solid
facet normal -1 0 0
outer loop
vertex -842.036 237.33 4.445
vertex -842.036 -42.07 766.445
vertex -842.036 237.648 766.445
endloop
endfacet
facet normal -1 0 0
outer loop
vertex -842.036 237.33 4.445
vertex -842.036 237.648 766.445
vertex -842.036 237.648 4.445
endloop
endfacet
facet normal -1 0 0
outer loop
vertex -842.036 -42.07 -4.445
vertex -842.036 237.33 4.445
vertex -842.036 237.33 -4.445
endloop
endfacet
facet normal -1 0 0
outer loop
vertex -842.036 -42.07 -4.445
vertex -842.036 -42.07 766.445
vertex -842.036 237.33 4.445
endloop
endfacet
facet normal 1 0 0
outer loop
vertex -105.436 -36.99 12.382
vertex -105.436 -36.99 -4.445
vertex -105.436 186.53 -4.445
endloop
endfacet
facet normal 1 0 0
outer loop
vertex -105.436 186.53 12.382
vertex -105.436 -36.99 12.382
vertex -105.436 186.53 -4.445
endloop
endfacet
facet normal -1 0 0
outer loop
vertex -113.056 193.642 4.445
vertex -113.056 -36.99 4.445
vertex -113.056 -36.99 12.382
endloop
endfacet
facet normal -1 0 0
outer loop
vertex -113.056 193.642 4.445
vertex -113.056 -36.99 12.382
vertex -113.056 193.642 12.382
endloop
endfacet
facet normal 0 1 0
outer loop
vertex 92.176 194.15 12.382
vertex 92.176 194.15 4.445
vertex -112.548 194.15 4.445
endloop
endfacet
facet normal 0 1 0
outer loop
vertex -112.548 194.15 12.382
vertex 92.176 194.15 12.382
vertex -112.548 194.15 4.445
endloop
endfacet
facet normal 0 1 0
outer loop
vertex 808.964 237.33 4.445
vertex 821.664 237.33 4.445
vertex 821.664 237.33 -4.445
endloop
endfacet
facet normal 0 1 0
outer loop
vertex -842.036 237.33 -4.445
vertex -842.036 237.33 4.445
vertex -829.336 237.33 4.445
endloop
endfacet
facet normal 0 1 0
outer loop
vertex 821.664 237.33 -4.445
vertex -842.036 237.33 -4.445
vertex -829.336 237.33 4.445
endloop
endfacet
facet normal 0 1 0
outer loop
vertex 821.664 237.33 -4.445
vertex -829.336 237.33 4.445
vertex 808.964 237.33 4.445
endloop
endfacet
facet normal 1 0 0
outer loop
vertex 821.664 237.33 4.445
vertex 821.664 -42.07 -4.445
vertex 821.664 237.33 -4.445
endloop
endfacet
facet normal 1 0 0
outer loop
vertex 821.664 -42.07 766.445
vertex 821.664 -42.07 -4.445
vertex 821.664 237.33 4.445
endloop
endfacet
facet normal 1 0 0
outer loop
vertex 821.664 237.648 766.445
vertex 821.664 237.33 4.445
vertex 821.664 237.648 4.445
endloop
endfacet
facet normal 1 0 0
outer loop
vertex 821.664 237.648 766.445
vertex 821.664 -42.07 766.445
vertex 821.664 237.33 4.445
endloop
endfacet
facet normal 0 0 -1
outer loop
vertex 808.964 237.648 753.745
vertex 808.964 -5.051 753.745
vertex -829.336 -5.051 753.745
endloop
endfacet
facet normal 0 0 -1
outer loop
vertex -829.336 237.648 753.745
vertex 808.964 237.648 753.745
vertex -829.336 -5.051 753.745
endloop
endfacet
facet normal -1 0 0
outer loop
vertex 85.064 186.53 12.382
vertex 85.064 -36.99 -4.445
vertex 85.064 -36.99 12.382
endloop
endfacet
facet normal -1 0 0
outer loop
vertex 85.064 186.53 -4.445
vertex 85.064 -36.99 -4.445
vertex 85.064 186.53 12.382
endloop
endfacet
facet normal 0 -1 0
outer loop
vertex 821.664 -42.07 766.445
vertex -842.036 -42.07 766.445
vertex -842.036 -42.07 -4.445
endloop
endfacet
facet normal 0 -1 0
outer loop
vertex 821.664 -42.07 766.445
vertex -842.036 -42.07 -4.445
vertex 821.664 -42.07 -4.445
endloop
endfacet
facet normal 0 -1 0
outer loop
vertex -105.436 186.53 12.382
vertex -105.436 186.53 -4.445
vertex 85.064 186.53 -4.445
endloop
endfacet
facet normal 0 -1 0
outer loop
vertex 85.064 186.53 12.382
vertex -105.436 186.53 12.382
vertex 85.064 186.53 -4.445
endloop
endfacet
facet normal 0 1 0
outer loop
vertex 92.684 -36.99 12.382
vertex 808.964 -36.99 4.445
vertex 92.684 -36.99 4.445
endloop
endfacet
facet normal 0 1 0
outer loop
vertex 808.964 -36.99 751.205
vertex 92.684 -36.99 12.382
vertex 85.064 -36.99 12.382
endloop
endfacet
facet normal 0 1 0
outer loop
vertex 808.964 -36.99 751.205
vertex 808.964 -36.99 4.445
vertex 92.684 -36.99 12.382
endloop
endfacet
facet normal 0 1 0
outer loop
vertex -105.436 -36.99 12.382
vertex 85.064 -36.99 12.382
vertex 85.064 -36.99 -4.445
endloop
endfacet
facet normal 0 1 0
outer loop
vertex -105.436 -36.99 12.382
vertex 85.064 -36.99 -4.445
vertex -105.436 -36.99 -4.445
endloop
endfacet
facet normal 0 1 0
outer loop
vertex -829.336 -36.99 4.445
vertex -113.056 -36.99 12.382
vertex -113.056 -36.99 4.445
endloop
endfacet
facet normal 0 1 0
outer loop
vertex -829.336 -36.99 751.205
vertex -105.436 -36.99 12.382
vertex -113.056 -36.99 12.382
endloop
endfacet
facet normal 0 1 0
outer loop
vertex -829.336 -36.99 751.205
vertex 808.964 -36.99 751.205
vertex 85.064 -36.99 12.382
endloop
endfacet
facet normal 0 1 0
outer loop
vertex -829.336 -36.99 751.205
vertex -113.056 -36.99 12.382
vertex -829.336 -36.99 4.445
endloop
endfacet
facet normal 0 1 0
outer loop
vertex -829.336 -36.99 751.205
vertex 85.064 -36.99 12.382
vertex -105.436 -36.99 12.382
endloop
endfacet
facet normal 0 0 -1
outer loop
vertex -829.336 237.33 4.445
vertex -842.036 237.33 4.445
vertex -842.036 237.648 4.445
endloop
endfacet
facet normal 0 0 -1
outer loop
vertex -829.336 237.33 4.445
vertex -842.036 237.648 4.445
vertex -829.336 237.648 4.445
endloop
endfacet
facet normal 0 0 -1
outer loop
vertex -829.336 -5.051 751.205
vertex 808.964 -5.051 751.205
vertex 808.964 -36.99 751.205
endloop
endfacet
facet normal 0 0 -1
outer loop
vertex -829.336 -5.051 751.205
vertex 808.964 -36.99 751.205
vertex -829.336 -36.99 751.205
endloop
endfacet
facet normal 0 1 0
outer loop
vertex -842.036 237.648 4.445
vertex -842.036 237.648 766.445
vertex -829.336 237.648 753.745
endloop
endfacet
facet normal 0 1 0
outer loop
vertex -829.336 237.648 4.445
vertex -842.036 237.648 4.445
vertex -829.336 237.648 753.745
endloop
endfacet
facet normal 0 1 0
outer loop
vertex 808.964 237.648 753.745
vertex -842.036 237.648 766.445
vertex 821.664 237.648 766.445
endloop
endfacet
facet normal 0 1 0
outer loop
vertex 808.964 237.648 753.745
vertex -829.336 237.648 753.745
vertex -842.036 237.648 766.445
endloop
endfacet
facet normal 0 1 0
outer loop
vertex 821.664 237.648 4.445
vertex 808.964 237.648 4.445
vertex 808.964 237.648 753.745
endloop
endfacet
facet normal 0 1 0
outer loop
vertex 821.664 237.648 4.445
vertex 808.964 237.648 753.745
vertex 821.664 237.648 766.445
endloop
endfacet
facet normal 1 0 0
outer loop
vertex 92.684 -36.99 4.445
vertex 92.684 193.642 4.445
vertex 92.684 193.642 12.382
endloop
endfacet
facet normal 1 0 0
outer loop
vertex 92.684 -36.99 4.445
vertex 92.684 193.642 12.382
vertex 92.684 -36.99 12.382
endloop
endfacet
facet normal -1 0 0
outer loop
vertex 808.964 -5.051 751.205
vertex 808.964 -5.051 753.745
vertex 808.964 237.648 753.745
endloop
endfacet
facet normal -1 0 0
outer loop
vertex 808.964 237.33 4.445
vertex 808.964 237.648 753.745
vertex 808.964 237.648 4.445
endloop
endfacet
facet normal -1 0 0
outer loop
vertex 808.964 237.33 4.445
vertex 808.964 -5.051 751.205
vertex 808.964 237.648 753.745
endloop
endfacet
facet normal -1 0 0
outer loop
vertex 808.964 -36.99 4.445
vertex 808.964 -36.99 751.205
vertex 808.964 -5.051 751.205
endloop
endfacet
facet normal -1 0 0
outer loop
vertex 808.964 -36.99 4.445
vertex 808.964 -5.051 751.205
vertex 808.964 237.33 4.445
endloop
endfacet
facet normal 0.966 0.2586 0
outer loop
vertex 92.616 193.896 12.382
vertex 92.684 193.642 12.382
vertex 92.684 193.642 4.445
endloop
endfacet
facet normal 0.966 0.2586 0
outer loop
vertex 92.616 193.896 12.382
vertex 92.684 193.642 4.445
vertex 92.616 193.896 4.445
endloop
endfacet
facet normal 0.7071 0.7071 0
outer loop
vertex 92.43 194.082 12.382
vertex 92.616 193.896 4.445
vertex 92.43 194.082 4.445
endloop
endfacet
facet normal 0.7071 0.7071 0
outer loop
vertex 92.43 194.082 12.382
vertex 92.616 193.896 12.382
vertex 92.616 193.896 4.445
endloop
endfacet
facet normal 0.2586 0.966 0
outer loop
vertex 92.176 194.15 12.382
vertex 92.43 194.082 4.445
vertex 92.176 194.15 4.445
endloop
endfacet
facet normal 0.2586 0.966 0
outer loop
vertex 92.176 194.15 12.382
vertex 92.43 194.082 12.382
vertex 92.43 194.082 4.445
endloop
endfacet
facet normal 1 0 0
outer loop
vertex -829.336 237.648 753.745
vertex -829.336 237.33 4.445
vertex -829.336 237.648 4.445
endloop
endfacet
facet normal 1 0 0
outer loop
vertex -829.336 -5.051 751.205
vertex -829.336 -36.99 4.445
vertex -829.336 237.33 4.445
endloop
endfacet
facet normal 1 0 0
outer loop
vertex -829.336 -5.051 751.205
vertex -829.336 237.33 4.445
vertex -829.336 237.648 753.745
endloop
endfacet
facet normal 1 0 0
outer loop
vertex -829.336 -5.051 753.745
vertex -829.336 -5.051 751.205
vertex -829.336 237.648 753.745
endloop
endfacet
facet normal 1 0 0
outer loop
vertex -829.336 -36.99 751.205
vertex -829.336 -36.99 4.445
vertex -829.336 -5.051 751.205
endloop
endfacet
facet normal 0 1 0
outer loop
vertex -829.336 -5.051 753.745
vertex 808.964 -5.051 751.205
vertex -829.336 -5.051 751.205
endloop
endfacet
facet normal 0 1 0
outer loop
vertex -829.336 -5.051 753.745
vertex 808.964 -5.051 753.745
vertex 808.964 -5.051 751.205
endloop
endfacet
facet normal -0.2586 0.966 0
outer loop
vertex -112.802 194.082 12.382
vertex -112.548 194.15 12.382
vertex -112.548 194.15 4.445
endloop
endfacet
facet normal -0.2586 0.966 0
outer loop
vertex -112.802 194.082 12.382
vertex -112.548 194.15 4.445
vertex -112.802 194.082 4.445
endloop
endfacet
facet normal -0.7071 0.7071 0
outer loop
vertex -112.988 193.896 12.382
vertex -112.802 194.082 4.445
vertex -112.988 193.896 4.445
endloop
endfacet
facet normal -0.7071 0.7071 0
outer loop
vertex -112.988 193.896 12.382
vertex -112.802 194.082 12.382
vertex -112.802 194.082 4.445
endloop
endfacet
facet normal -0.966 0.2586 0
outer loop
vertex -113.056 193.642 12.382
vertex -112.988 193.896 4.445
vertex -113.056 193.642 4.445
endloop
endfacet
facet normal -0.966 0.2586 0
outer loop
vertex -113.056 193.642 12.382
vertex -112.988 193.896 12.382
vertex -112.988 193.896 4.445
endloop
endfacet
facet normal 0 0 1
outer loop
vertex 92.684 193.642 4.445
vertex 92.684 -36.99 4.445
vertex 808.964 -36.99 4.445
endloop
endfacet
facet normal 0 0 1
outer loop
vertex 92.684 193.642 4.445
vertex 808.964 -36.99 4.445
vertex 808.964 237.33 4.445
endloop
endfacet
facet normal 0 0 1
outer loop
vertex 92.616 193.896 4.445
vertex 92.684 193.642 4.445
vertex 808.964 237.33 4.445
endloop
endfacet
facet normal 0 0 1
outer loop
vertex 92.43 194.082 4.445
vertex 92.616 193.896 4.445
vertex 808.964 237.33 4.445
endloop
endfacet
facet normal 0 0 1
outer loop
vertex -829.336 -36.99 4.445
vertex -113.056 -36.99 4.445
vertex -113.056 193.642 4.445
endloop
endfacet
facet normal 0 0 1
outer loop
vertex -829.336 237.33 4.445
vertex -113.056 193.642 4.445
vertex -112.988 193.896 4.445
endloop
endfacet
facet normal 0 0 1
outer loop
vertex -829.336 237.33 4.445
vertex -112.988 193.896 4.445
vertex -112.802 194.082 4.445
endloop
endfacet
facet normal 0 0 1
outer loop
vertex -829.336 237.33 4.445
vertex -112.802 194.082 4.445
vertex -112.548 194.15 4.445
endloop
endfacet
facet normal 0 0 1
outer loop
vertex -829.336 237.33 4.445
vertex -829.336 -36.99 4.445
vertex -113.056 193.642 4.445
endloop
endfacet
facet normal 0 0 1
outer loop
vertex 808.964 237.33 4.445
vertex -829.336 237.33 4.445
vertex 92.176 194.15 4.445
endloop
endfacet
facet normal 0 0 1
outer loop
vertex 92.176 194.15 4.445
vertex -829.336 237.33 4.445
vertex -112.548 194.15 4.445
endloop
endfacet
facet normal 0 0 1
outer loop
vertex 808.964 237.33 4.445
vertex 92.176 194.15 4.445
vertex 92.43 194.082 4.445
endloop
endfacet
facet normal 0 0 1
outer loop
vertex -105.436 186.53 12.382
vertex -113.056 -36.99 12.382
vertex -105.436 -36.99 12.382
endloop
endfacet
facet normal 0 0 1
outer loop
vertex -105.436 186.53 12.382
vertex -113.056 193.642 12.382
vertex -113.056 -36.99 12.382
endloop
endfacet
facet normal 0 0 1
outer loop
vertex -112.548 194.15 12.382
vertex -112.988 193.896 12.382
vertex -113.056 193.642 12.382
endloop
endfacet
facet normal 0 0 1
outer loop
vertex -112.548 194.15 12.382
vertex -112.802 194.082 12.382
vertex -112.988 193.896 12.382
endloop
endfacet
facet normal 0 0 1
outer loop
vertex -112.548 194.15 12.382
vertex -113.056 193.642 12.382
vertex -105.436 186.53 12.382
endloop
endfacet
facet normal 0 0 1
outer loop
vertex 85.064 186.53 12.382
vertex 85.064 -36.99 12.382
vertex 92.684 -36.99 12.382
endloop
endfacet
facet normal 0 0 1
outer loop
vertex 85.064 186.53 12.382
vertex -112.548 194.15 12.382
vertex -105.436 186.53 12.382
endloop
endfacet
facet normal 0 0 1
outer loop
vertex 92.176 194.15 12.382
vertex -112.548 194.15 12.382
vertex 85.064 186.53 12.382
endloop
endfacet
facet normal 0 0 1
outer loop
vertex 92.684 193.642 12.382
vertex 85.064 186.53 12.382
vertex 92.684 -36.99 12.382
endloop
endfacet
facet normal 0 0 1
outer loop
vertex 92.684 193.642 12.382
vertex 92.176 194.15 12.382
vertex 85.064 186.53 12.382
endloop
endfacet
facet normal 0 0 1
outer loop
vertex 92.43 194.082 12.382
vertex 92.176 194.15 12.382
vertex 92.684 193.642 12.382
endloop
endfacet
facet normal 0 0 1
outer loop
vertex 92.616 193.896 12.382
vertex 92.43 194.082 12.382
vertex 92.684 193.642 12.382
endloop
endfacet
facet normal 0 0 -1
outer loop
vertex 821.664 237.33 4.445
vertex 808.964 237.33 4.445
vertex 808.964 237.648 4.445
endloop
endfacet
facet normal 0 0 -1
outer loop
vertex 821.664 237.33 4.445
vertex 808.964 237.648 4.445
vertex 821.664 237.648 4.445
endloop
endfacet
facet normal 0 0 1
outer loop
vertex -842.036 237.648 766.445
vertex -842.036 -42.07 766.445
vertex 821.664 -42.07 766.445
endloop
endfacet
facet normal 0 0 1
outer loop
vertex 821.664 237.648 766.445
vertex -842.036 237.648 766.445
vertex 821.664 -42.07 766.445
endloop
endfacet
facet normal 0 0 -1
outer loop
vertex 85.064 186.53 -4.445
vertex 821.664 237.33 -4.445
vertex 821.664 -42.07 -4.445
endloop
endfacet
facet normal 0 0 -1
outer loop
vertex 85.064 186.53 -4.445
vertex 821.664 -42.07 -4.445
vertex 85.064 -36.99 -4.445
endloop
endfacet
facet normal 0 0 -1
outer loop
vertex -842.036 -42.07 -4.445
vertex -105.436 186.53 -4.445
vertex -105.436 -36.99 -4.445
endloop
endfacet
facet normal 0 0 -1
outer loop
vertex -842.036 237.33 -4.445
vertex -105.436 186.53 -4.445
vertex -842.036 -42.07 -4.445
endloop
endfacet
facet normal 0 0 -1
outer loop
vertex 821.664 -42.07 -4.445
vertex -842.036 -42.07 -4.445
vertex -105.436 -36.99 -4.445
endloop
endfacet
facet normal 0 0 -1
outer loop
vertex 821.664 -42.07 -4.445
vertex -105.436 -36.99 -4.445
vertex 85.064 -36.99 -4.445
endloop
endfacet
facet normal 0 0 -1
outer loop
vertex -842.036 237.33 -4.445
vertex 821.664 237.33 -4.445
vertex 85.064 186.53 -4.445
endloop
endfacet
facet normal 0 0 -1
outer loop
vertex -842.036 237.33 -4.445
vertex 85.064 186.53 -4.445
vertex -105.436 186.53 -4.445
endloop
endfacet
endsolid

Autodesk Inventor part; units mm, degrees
ref_plane "YZ Plane" through (0, 0, 0) normal (1, 0, 0) x (0, 1, 0)
ref_plane "XZ Plane" through (0, 0, 0) normal (0, 1, 0) x (-1, 0, 0)
ref_plane "XY Plane" through (0, 0, 0) normal (0, 0, 1) x (1, 0, 0)
sketch "Sketch1" plane through (0, 0, 0) normal (0, 0, 1) x (1, 0, 0)
  line L0 (-105.4358, -42.0697) -> (85.0642, -42.0697)
  line L1 (85.0642, -42.0697) -> (85.0642, 186.5303)
  line L2 (85.0642, 186.5303) -> (-105.4358, 186.5303)
  line L3 (-105.4358, 186.5303) -> (-105.4358, -42.0697)
  line L4 (-105.4358, -42.0697) -> (-156.2358, -42.0697)
  line L5 (-156.2358, -42.0697) -> (-156.2358, 237.3303)
  line L6 (-156.2358, 237.3303) -> (135.8642, 237.3303)
  line L7 (135.8642, 237.3303) -> (135.8642, -42.0697)
  line L8 (135.8642, -42.0697) -> (85.0642, -42.0697)
  point P0 (0, 0)
  dimension "d0" = 228.6
  dimension "d1" = 190.5
  dimension "d2" = 50.8
  dimension "d3" = 279.4
  dimension "d4" = 292.1
extrude "Door Frame CR" add sketch "Sketch1" along normal mid plane 8.89 contours L4 L5 L6 L7 L8 L1 L2 L3
sketch "Sketch2" plane through (-156.2358, -42.0697, 4.445) normal (-1, 0, 0) x (0, 0, 1)
  line L0 (-8.89, 279.4) -> (-8.89, 0) projected
  line L1 (-8.89, 279.4) -> (0, 279.4)
  line L2 (0, 279.4) -> (0, 0)
  line L3 (0, 0) -> (-8.89, 0)
  line L4 (-8.89, 0) -> (-8.89, 279.4)
  point P0 (-4.445, 42.0697)
extrude "Door Frame left Extruded" add sketch "Sketch2" along normal blind 685.8
sketch "Sketch4" plane through (135.8642, -42.0697, 4.445) normal (1, 0, 0) x (0, 0, -1)
  line L0 (0, 0) -> (0, 279.4) projected
  line L1 (8.89, 228.6) -> (8.89, 0) projected
  line L2 (0, 279.4) -> (8.89, 279.4)
  line L3 (8.89, 279.4) -> (8.89, 0)
  line L4 (8.89, 0) -> (0, 0)
  line L5 (0, 0) -> (0, 279.4)
  point P0 (4.445, 42.0697)
extrude "Door Frame right Extruded" add sketch "Sketch4" along normal blind 685.8
sketch "Sketch5" plane through (0, 0, 4.445) normal (0, 0, 1) x (1, 0, 0)
  line L0 (-842.0358, 237.3303) -> (-842.0358, -42.0697) projected
  line L1 (821.6642, 237.3303) -> (821.6642, -42.0697) projected
  line L2 (-842.0358, -42.0697) -> (821.6642, -42.0697)
  line L3 (821.6642, -42.0697) -> (821.6642, -36.9897)
  line L4 (821.6642, -36.9897) -> (-842.0358, -36.9897)
  line L5 (-842.0358, -36.9897) -> (-842.0358, -42.0697)
  point P0 (0, 0)
  dimension "d11" = 5.08
extrude "Floor" add sketch "Sketch5" along normal blind 762
sketch "Sketch7" plane through (-105.4358, -36.9897, 4.445) normal (0, 1, 0) x (1, 0, 0)
  line L0 (-736.6, 0) -> (0, 0) projected
  line L1 (-736.6, -762) -> (927.1, -762) projected
  line L2 (-736.6, 0) -> (-723.9, 0)
  line L3 (-723.9, 0) -> (-723.9, -749.3)
  line L4 (-723.9, -762) -> (-736.6, -762)
  line L5 (-736.6, -762) -> (-736.6, 0)
  line L6 (927.1, 8.89) -> (927.1, -762) projected
  line L7 (-723.9, -762) -> (927.1, -762)
  line L8 (927.1, -762) -> (927.1, -749.3)
  line L9 (914.4, -749.3) -> (-723.9, -749.3)
  line L10 (190.5, 0) -> (927.1, 0) projected
  line L11 (914.4, -749.3) -> (914.4, 0)
  line L12 (914.4, 0) -> (927.1, 0)
  line L13 (927.1, 0) -> (927.1, -749.3)
  point P0 (105.4358, 4.445)
  dimension "d21" = 12.7
extrude "Walls" add sketch "Sketch7" along normal blind 274.6375
sketch "Door Frame" plane through (0, 0, 4.445) normal (0, 0, 1) x (1, 0, 0)
  line L0 (-105.4358, -36.9897) -> (-105.4358, 186.5303) projected
  line L1 (-105.4358, -36.9897) -> (-113.0558, -36.9897)
  line L2 (-113.0558, -36.9897) -> (-113.0558, 186.5303)
  line L3 (-105.4358, 186.5303) -> (-105.4358, -36.9897)
  line L4 (-105.4358, 186.5303) -> (85.0642, 186.5303) projected
  line L5 (92.6842, 185.3187) -> (92.6842, -36.9897)
  line L6 (92.6842, -36.9897) -> (85.0642, -36.9897)
  line L7 (85.0642, -36.9897) -> (85.0642, 186.5303)
  line L8 (-105.4358, 186.5303) -> (85.0642, 186.5303)
  line L9 (92.6842, 185.3187) -> (92.6842, 194.1503)
  line L10 (92.6842, 194.1503) -> (-113.0558, 194.1503)
  line L11 (-113.0558, 194.1503) -> (-113.0558, 186.5303)
  point P0 (0, 0)
  dimension "d27" = 7.62
  dimension "d28" = 7.62
  dimension "d29" = 7.62
extrude "Extrusion7" add sketch "Door Frame" along normal blind 7.9375
fillet "Dorr Fillet" radius 0.508 1 edges at (-113.0558, 194.1503, 8.4138)
fillet "Door Fillet" radius 0.508 1 edges at (92.6842, 194.1503, 8.4138)
sketch "Sketch9" plane through (0, 0, 4.445) normal (0, 0, -1) x (-1, 0, 0)
  line L0 (-85.0642, -36.9897) -> (-85.0642, -42.0697) projected
  line L1 (-85.0642, -36.9897) -> (105.4358, -36.9897)
  line L2 (105.4358, -36.9897) -> (105.4358, -42.0697)
  line L3 (105.4358, -42.0697) -> (-85.0642, -42.0697)
  line L4 (-85.0642, -42.0697) -> (-85.0642, -36.9897)
  point P0 (0, 0)
extrude "Door floor" add sketch "Sketch9" along normal blind 8.89
sketch "Sketch13" plane through (808.9642, -36.9897, 753.745) normal (0, 0, -1) x (-1, 0, 0)
  line L0 (-12.7, -5.08) -> (-12.7, 274.6375) projected
  line L1 (-12.7, 31.9391) -> (1651, 31.9391)
  line L2 (1651, 31.9391) -> (1651, -1.0809)
  line L3 (1651, -1.0809) -> (-12.7, -1.0809)
  line L4 (-12.7, -1.0809) -> (-12.7, 31.9391)
  point P0 (808.9642, 36.9897)
  dimension "d36" = 33.02
extrude "wall board" add sketch "Sketch13" along normal blind 2.54
sketch "Sketch14" plane through (808.9642, -36.9897, 4.445) normal (-1, 0, 0) x (0, 0, 1)
  line L0 (-8.89, -5.08) -> (-8.89, 274.32) projected
  line L1 (762, -5.08) -> (762, 274.6375) projected
  line L2 (-8.89, -5.08) -> (762, -5.08)
  line L3 (762, -5.08) -> (762, 27.94)
  line L4 (762, 27.94) -> (-8.89, 27.94)
  line L5 (-8.89, 27.94) -> (-8.89, -5.08)
  point P0 (-4.445, 36.9897)
  dimension "d39" = 33.02
properties part number "Top Office Layer (safety save)"
